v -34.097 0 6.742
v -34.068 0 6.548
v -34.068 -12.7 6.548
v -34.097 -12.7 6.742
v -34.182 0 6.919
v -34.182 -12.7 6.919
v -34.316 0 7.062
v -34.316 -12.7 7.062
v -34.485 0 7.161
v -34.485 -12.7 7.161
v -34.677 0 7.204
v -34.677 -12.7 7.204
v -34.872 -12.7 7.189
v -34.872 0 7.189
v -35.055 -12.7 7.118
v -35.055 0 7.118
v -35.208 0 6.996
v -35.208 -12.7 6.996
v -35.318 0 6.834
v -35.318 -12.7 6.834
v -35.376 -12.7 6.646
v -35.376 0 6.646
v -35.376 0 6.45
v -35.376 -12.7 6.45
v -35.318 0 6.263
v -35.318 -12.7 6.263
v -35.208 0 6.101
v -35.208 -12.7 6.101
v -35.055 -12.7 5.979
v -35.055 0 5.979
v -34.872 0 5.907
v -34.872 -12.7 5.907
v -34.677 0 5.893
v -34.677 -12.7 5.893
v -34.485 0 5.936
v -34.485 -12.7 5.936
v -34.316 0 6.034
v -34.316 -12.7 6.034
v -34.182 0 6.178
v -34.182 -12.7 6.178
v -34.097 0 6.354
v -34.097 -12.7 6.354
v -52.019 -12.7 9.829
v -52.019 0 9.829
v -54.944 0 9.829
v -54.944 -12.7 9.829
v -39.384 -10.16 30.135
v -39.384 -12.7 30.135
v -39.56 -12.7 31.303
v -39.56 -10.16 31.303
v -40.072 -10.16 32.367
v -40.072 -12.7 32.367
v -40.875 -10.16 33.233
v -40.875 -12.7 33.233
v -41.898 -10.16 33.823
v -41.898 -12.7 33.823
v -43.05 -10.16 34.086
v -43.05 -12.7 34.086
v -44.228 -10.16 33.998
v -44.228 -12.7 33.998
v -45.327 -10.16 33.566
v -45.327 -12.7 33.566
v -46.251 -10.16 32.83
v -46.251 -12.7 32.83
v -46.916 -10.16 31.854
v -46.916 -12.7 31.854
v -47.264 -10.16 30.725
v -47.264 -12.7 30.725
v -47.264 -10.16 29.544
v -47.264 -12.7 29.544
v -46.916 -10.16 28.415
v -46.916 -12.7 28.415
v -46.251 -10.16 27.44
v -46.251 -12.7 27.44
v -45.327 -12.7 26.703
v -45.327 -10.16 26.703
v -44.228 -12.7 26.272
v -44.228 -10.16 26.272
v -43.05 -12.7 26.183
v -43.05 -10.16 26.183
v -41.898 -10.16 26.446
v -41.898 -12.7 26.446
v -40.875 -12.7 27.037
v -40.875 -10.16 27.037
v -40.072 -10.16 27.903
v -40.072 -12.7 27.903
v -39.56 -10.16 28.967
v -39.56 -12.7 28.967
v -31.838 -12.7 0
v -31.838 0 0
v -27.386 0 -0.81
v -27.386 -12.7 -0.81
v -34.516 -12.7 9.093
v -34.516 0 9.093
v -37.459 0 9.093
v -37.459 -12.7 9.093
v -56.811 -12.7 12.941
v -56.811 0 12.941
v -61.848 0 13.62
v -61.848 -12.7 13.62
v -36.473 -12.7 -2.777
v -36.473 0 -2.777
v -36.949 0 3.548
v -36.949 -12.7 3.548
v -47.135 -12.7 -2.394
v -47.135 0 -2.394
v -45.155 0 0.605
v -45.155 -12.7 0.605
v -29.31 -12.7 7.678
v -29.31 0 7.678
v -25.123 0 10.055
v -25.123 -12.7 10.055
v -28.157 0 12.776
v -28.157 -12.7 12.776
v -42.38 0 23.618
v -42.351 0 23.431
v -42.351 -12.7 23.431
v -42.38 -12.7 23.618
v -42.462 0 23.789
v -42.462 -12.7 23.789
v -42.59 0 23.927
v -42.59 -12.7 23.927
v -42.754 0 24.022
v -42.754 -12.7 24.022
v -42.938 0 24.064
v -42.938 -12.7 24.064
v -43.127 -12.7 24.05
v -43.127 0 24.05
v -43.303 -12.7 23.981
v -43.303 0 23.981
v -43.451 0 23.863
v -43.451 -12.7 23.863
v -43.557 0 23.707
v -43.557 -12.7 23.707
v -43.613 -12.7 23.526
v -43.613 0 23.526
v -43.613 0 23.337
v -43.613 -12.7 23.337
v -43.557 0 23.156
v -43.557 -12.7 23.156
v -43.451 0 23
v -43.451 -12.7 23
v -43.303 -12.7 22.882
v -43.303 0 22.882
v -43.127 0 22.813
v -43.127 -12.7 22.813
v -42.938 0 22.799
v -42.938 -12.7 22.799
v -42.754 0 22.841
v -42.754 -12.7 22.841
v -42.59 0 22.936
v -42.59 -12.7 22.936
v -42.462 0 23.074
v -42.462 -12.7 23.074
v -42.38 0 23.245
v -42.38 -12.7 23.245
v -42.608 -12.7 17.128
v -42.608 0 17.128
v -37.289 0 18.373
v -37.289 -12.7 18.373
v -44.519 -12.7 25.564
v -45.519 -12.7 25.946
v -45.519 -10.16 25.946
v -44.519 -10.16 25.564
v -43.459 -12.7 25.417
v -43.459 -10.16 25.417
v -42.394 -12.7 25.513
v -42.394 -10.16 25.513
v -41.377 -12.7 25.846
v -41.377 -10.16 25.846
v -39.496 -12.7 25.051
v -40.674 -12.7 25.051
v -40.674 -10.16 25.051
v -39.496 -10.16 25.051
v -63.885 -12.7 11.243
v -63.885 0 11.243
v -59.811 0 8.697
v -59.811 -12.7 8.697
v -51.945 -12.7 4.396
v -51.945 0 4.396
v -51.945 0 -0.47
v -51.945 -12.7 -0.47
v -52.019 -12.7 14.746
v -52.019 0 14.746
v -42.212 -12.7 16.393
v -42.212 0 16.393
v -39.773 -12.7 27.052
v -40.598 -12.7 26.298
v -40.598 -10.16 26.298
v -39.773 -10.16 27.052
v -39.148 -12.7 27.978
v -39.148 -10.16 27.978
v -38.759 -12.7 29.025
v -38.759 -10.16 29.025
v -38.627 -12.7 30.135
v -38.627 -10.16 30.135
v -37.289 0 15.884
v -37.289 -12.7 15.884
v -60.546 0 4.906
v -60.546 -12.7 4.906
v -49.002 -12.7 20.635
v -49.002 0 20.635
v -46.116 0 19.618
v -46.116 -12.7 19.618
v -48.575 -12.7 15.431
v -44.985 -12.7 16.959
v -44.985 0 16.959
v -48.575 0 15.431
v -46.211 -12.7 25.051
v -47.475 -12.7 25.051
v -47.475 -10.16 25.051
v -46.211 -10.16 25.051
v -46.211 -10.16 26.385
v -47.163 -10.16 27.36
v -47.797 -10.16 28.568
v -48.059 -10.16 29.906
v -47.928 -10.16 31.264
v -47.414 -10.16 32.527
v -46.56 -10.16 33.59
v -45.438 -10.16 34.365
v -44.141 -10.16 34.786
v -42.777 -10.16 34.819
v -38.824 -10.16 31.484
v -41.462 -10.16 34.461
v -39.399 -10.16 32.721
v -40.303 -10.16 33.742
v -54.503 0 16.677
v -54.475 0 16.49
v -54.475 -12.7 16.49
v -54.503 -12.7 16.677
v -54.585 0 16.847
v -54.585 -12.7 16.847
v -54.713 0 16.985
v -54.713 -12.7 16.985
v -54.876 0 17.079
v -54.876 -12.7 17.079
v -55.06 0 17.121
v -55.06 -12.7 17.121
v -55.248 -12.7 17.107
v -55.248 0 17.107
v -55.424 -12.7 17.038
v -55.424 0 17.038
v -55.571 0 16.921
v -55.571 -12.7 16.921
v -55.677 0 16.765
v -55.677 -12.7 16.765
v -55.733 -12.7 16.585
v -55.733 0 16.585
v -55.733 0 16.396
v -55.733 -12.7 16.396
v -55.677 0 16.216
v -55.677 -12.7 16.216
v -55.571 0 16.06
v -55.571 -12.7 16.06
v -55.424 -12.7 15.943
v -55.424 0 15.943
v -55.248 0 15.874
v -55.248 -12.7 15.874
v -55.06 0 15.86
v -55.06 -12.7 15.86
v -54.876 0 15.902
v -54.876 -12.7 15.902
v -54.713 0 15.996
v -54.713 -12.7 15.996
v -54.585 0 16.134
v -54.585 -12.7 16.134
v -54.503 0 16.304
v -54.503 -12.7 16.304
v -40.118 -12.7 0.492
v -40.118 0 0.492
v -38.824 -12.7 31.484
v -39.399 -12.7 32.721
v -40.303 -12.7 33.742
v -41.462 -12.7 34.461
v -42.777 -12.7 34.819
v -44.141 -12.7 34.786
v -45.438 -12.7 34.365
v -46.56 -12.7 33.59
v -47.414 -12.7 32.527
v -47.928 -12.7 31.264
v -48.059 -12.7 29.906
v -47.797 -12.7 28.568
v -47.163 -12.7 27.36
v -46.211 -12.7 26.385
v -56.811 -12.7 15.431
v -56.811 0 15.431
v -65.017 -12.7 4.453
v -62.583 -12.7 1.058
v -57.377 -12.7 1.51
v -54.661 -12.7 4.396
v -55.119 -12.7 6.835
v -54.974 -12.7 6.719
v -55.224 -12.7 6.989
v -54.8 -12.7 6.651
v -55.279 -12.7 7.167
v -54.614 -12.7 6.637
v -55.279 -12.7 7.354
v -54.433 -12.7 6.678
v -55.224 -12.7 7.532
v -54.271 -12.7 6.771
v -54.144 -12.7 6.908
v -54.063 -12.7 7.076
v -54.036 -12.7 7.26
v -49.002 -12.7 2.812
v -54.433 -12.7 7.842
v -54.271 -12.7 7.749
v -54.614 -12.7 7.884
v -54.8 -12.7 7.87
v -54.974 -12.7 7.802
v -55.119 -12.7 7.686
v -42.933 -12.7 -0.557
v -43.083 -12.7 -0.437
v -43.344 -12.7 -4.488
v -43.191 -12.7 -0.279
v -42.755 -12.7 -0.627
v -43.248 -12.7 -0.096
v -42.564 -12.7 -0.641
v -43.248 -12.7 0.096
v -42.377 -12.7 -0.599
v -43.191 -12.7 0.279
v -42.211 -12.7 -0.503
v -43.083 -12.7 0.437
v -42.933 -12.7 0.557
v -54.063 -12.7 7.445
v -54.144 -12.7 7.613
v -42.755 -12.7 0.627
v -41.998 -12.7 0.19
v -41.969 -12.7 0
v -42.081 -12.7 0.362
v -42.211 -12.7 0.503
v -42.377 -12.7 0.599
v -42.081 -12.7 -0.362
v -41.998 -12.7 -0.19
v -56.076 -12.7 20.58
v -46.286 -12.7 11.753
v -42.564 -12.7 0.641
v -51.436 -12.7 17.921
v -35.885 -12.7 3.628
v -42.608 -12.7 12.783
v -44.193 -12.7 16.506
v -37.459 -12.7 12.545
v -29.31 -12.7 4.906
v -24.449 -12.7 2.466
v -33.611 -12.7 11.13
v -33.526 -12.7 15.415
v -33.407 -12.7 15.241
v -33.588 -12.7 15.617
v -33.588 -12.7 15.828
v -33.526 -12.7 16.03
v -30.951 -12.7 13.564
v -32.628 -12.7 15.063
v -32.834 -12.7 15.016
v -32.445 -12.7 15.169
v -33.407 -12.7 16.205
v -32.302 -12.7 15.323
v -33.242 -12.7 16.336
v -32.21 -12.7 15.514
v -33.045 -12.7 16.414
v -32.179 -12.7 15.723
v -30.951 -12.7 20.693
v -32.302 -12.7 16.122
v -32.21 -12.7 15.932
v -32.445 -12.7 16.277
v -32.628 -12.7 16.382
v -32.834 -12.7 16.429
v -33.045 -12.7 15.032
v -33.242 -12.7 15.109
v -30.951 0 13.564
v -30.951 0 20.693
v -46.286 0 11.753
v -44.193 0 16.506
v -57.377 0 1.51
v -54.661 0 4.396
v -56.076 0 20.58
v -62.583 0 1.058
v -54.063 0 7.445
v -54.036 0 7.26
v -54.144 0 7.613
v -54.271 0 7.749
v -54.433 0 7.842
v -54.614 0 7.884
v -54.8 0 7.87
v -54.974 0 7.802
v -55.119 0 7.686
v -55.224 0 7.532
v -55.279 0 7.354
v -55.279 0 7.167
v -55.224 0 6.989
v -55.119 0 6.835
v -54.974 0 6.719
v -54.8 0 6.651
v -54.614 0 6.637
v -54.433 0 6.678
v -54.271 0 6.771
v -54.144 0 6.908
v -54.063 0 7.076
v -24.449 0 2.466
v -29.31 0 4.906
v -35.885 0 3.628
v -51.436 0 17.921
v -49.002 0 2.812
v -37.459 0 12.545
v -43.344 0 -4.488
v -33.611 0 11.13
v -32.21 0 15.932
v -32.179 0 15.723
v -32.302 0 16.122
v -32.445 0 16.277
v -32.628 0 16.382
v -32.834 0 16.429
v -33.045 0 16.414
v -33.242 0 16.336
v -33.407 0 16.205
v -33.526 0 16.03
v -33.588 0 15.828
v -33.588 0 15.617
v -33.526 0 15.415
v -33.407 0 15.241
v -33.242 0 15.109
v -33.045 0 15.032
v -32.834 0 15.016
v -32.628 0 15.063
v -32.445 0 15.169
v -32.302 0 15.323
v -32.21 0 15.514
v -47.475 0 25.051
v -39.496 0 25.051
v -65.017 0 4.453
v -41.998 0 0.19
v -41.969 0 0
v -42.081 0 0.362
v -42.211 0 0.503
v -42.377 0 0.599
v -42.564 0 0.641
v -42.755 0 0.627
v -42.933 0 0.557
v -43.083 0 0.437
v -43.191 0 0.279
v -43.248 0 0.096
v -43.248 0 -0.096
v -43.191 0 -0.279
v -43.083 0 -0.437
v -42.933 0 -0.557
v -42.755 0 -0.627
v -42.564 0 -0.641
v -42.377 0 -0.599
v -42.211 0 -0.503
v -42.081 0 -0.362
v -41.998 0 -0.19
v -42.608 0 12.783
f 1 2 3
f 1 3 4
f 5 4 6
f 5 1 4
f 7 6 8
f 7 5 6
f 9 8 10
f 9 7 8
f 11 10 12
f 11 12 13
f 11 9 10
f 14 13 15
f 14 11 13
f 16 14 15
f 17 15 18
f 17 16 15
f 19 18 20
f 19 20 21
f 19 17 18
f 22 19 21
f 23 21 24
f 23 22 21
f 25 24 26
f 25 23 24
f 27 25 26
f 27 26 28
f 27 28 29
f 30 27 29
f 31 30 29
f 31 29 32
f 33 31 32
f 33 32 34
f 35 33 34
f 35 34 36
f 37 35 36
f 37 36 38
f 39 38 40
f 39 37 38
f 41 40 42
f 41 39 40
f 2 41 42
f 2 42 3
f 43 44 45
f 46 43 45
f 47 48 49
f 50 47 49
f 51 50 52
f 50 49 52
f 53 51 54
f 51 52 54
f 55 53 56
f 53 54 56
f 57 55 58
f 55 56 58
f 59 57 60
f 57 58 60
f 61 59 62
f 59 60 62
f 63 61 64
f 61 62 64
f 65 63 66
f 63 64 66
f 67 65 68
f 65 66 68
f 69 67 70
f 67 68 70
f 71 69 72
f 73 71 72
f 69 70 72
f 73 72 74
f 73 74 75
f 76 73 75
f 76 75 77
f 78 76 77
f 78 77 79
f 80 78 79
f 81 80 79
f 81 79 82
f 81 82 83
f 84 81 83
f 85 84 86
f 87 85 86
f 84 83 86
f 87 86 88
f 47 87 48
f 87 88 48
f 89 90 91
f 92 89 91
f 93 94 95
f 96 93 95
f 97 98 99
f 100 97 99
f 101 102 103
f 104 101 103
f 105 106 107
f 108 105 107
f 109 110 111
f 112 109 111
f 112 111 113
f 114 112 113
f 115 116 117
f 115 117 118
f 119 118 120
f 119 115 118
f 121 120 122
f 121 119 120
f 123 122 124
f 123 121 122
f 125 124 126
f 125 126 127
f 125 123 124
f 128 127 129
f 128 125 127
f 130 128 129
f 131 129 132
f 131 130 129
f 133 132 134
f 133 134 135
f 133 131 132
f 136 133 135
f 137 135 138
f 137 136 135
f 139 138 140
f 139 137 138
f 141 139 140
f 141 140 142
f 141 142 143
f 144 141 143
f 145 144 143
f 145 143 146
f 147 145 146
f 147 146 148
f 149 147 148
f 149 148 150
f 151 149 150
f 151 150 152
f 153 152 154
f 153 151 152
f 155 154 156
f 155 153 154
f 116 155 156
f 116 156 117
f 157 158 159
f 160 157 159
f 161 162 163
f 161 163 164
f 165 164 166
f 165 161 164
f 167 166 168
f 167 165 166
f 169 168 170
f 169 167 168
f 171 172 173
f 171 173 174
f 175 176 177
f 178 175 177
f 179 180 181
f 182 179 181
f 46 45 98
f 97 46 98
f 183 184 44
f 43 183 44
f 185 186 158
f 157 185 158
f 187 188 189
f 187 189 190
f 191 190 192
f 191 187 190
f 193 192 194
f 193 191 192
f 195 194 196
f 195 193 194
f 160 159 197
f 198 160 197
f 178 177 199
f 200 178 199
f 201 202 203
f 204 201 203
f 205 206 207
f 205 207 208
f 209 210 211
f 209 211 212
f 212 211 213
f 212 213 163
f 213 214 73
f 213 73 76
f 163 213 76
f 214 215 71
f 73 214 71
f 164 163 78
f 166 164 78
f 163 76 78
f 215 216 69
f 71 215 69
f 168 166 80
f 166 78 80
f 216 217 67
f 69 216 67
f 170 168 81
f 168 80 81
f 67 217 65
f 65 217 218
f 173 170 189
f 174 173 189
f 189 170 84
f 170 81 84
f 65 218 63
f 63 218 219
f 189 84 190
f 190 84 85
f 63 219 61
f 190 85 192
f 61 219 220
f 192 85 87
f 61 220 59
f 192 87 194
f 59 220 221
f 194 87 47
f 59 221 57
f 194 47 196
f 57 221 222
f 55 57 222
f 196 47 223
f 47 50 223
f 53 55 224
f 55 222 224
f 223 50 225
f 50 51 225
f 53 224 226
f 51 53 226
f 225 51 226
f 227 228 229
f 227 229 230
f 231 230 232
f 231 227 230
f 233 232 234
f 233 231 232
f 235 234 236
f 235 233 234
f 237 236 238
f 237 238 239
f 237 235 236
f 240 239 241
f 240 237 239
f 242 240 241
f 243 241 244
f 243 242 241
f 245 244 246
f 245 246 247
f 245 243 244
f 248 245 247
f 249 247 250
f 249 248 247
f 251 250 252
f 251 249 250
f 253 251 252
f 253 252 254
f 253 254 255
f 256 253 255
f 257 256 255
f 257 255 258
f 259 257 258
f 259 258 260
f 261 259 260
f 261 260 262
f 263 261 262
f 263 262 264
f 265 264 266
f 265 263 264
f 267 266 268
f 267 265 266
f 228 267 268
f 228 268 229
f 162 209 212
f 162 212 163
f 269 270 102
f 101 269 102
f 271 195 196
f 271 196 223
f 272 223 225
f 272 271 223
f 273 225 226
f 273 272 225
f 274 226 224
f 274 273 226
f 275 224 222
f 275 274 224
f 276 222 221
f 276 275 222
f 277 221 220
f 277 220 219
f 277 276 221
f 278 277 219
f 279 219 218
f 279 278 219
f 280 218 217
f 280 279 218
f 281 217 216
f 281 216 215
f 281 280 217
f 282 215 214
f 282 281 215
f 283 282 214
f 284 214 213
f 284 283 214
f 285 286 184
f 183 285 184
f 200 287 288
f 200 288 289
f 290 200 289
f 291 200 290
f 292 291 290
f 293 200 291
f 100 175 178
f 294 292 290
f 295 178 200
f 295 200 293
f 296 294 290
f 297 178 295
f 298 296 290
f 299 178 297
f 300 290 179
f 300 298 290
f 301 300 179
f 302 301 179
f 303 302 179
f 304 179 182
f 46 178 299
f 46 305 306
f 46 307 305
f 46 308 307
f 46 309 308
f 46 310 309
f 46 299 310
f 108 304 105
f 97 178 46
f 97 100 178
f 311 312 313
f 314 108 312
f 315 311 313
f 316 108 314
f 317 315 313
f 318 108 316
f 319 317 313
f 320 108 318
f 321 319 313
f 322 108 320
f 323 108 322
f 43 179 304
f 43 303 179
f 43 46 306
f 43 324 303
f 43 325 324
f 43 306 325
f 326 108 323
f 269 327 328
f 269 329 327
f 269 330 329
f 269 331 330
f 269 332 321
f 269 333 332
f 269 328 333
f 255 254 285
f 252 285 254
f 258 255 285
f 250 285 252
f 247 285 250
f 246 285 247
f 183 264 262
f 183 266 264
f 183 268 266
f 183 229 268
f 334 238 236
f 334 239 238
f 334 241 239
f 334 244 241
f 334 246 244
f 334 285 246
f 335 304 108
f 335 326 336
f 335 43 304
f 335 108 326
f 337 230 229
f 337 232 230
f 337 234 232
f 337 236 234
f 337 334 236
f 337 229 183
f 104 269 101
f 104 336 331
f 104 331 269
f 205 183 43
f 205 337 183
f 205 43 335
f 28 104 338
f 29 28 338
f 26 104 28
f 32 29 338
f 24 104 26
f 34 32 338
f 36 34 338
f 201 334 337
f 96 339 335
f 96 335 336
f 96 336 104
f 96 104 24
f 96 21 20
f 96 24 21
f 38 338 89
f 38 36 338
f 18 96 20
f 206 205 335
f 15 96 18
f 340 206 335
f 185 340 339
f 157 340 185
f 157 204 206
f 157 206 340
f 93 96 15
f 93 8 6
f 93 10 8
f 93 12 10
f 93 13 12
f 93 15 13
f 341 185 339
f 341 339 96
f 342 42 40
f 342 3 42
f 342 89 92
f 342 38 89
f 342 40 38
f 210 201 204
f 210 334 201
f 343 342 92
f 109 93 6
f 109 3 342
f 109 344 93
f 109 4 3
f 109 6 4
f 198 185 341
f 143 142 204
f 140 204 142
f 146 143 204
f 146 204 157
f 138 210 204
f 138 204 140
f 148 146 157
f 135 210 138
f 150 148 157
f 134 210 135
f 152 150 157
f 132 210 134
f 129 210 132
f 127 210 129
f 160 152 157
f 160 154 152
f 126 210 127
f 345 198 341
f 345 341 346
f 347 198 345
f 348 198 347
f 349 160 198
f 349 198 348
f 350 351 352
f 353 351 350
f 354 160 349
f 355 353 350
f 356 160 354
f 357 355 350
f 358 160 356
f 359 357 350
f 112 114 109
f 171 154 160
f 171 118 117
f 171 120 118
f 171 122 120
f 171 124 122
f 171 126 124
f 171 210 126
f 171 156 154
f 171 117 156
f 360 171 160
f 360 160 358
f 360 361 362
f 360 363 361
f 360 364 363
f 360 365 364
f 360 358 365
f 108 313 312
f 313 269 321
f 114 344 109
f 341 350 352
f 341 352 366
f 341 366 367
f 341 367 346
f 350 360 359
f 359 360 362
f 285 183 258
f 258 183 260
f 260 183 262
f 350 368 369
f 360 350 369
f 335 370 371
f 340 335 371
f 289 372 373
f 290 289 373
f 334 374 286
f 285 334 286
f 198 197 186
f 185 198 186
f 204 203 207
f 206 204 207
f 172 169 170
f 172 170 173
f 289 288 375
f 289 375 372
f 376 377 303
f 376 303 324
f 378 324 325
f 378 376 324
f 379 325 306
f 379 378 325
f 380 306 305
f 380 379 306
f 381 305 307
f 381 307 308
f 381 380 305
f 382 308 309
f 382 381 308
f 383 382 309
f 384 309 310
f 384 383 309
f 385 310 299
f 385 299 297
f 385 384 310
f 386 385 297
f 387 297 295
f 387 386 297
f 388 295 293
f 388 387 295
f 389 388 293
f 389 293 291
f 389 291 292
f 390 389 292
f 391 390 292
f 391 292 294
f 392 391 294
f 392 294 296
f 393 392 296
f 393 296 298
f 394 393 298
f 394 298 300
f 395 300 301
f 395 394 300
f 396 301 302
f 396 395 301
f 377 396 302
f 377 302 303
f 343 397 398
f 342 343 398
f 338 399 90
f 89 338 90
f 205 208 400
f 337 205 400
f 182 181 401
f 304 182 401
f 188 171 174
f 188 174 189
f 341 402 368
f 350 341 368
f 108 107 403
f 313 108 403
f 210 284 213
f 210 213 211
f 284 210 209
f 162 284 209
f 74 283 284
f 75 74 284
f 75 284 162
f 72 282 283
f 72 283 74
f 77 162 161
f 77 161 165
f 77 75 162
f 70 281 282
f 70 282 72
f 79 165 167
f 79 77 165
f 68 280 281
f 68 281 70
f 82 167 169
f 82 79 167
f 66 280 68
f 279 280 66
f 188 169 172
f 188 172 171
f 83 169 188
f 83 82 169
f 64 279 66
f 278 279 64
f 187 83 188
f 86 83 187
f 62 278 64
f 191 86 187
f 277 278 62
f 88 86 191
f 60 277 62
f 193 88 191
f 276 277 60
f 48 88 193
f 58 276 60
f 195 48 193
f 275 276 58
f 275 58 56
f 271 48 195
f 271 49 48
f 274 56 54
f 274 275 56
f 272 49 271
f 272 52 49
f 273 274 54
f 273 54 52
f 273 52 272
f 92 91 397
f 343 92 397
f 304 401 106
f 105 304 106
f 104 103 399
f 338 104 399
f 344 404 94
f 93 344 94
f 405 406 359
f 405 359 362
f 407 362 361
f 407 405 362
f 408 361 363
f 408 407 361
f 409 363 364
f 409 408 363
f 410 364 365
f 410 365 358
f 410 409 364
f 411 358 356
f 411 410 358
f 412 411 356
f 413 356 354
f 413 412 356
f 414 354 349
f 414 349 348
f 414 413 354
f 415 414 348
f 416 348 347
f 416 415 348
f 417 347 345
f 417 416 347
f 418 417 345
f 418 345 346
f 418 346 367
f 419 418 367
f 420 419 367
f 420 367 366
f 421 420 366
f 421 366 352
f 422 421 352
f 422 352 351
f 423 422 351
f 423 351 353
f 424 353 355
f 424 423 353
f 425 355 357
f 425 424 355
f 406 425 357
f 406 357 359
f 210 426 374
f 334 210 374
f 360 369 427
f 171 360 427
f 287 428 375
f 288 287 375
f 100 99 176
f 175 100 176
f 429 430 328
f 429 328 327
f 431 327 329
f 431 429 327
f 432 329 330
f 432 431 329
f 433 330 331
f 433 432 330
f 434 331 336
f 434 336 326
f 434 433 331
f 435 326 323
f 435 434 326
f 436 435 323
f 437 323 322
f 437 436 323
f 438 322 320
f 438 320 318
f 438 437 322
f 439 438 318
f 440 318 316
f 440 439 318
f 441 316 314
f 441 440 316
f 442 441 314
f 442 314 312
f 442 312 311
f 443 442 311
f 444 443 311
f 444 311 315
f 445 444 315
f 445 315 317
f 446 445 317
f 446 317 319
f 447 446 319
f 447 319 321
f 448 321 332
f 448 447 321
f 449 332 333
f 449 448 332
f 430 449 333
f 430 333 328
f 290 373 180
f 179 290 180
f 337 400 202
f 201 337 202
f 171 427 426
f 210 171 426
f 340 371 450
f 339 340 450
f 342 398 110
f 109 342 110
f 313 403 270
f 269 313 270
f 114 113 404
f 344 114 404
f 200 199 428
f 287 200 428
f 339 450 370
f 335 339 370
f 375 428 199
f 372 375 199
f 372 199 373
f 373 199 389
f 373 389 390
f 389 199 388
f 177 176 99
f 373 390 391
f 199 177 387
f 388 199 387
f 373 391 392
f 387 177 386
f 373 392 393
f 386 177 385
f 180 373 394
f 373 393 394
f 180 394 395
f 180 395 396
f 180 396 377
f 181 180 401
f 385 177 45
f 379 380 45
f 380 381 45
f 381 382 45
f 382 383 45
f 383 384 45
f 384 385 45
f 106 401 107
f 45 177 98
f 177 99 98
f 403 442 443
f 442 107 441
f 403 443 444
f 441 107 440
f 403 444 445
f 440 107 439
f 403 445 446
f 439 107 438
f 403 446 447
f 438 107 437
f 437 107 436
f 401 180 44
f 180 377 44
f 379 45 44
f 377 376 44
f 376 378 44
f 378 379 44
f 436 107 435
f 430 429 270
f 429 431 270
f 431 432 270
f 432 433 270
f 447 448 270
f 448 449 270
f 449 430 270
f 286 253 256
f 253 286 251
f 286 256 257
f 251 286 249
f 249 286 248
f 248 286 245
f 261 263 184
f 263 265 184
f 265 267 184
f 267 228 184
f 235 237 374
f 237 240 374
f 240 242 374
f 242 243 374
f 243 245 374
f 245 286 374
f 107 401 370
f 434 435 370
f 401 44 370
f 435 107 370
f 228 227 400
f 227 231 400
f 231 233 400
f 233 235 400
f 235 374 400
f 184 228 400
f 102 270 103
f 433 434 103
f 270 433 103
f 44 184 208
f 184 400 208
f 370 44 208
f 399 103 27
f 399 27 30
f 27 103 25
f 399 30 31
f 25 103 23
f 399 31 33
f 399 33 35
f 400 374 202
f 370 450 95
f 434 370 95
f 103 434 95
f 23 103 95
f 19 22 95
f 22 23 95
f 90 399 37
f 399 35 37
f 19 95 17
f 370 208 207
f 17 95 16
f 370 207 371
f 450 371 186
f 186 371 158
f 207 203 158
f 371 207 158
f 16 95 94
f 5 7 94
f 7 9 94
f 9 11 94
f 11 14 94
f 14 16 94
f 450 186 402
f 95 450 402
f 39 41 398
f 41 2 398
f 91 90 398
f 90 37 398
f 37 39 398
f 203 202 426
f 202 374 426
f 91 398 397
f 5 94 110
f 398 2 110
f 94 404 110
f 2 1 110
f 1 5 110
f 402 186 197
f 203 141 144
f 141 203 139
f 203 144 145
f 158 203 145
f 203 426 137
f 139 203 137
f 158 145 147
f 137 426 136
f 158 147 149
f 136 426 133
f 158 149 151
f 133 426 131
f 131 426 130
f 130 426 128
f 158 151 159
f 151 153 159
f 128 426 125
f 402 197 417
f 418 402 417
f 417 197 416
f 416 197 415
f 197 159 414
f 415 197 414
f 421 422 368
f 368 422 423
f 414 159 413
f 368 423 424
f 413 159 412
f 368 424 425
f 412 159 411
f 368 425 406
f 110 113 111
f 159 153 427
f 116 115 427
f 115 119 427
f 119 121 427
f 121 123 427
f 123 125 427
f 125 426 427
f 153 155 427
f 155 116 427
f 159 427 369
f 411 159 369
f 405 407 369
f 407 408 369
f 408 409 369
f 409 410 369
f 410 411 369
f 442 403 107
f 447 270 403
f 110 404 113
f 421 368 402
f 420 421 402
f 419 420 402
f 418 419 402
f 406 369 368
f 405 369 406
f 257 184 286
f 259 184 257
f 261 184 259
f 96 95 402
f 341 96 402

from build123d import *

# Parameters (mm, degrees)
F0_R     = 0.6253308063
F0_R_2   = 0.6576470557
F0_R_3   = 0.6430310393
F0_R_4   = 0.6325864549
F0_R_5   = 0.7087084558
F0_R_6   = 0.63416899
F1_DEPTH = 12.7
F3_R     = 3.9624414974
F4_DEPTH = 2.54


# Not quite as in the source:
# - the program builds the solid bodies; features that only make, move or delete a surface that nothing else refers to are left out


with BuildPart() as f1:
    # F0 (on Front) → F1 (new body)
    with BuildSketch(Plane.XZ):
        Polygon((-61.8477277458, 13.6200906709), (-63.8848692179, 11.2434281036), (-59.810589999, 8.6970031261), (-60.5462230742, 4.9056601711), (-65.0166124105, 4.4529624283), (-62.5833645463, 1.0577295907), (-57.3773384094, 1.5104275662), (-54.661154747, 4.3963752687), (-53.1898848712, 4.3963752687), (-53.1898848712, 9.8287472501), (-54.9440905452, 9.8287472501), (-56.8114668131, 12.941043824), align=None)
        with Locations((-54.6610355377, 7.2603821754)):
            Circle(F0_R, mode=Mode.SUBTRACT)
        Polygon((-34.516107291, 9.0931132436), (-35.9873734415, 9.0931132436), (-35.8845129038, 3.6278230993), (-31.8380962585, 0), (-27.3861158639, -0.8096481324), (-24.4493998371, 2.4659185885), (-29.3100811541, 4.9056601711), (-29.3100811541, 7.6784333214), (-25.1226276159, 10.0550958887), (-28.1569631866, 12.7755356355), (-33.6107090116, 11.1302537844), align=None)
        with Locations((-34.7257182002, 6.5483227372)):
            Circle(F0_R_2, mode=Mode.SUBTRACT)
        Polygon((-52.0185305594, 9.8287472501), (-53.1898848712, 9.8287472501), (-53.1898848712, 4.3963752687), (-51.9449673593, 4.3963752687), (-51.9449673593, -0.4701253201), (-49.0024313331, 2.8119329363), (-47.1350550652, -2.3940897081), (-45.1545007527, 0.6050316733), (-43.3437116444, -4.4878176413), (-40.11823982, 0.4918571794), (-36.4727111343, -2.7765490017), (-36.9493551552, 3.54756671), (-35.8845129038, 3.6278230993), (-35.9873734415, 9.0931132436), (-37.4586395919, 9.0931132436), (-37.4586395919, 12.5449337065), (-30.9511106461, 13.5635035113), (-30.9511106461, 20.6934921443), (-39.495781064, 25.0507071614), (-47.474578023, 25.0507071614), (-56.0758337379, 20.5803178251), (-56.8114668131, 15.4308816418), (-52.0185305594, 14.7461770819), align=None)
        with Locations((-42.6119677722, 0)):
            Circle(F0_R_3, mode=Mode.SUBTRACT)
        with Locations((-55.1074296236, 16.4904613048)):
            Circle(F0_R_4, mode=Mode.SUBTRACT)
        Polygon((-48.5752017703, 15.4308816418), (-51.4356829226, 17.9207194597), (-49.0024313331, 20.6347298909), (-46.1164824665, 19.6183361113), (-44.9847392738, 16.9587358832), align=None, mode=Mode.SUBTRACT)
        Polygon((-42.6080785692, 12.7825982869), (-46.2862439454, 11.7527125403), (-44.1925190389, 16.5060386062), align=None, mode=Mode.SUBTRACT)
        Polygon((-42.2119647264, 16.3928642869), (-42.6080785692, 17.1284973621), (-37.288878113, 18.3734167367), (-37.288878113, 15.8835798502), align=None, mode=Mode.SUBTRACT)
        with Locations((-32.8873321414, 15.7226305455)):
            Circle(F0_R_5, mode=Mode.SUBTRACT)
        with Locations((-42.985662818, 23.4314408153)):
            Circle(F0_R_6, mode=Mode.SUBTRACT)
    extrude(amount=F1_DEPTH)


with BuildPart() as f4:
    # F3 (on face) → F4 (new body)
    with BuildSketch(Plane.XZ.offset(12.7)):
        with BuildLine():
            ThreePointArc((-40.5978600179, 26.2984021236), (-39.1484875063, 27.9782117542), (-38.6269349154, 30.1346959223))
            ThreePointArc((-38.6269349154, 30.1346959223), (-45.437652272, 34.3648308471), (-46.2107199183, 26.3847131282))
            ThreePointArc((-46.2107199183, 26.3847131282), (-45.8743308801, 26.1501557938), (-45.5188478641, 25.9456892843))
            ThreePointArc((-45.5188478641, 25.9456892843), (-43.4592958766, 25.4170304905), (-41.3767340339, 25.8461816066))
            ThreePointArc((-41.3767340339, 25.8461816066), (-40.9764839308, 26.053668122), (-40.5978600179, 26.2984021236))
        make_face()
        with Locations((-43.3459614898, 30.1346959223)):
            Circle(F3_R, mode=Mode.SUBTRACT)
        with BuildLine():
            Line((-46.2107199183, 26.3847131282), (-47.474578023, 25.0507071614))
            Line((-47.474578023, 25.0507071614), (-46.2107199183, 25.0507071614))
            Line((-46.2107199183, 25.0507071614), (-45.5188478641, 25.9456892843))
            ThreePointArc((-45.5188478641, 25.9456892843), (-45.8743308801, 26.1501557938), (-46.2107199183, 26.3847131282))
        make_face()
        with BuildLine():
            Line((-41.3767340339, 25.8461816066), (-40.674097836, 25.0507071614))
            Line((-40.674097836, 25.0507071614), (-39.495781064, 25.0507071614))
            Line((-39.495781064, 25.0507071614), (-40.5978600179, 26.2984021236))
            ThreePointArc((-40.5978600179, 26.2984021236), (-40.9764839308, 26.053668122), (-41.3767340339, 25.8461816066))
        make_face()
    extrude(amount=-F4_DEPTH)


solid = Compound([f1.part, f4.part])
